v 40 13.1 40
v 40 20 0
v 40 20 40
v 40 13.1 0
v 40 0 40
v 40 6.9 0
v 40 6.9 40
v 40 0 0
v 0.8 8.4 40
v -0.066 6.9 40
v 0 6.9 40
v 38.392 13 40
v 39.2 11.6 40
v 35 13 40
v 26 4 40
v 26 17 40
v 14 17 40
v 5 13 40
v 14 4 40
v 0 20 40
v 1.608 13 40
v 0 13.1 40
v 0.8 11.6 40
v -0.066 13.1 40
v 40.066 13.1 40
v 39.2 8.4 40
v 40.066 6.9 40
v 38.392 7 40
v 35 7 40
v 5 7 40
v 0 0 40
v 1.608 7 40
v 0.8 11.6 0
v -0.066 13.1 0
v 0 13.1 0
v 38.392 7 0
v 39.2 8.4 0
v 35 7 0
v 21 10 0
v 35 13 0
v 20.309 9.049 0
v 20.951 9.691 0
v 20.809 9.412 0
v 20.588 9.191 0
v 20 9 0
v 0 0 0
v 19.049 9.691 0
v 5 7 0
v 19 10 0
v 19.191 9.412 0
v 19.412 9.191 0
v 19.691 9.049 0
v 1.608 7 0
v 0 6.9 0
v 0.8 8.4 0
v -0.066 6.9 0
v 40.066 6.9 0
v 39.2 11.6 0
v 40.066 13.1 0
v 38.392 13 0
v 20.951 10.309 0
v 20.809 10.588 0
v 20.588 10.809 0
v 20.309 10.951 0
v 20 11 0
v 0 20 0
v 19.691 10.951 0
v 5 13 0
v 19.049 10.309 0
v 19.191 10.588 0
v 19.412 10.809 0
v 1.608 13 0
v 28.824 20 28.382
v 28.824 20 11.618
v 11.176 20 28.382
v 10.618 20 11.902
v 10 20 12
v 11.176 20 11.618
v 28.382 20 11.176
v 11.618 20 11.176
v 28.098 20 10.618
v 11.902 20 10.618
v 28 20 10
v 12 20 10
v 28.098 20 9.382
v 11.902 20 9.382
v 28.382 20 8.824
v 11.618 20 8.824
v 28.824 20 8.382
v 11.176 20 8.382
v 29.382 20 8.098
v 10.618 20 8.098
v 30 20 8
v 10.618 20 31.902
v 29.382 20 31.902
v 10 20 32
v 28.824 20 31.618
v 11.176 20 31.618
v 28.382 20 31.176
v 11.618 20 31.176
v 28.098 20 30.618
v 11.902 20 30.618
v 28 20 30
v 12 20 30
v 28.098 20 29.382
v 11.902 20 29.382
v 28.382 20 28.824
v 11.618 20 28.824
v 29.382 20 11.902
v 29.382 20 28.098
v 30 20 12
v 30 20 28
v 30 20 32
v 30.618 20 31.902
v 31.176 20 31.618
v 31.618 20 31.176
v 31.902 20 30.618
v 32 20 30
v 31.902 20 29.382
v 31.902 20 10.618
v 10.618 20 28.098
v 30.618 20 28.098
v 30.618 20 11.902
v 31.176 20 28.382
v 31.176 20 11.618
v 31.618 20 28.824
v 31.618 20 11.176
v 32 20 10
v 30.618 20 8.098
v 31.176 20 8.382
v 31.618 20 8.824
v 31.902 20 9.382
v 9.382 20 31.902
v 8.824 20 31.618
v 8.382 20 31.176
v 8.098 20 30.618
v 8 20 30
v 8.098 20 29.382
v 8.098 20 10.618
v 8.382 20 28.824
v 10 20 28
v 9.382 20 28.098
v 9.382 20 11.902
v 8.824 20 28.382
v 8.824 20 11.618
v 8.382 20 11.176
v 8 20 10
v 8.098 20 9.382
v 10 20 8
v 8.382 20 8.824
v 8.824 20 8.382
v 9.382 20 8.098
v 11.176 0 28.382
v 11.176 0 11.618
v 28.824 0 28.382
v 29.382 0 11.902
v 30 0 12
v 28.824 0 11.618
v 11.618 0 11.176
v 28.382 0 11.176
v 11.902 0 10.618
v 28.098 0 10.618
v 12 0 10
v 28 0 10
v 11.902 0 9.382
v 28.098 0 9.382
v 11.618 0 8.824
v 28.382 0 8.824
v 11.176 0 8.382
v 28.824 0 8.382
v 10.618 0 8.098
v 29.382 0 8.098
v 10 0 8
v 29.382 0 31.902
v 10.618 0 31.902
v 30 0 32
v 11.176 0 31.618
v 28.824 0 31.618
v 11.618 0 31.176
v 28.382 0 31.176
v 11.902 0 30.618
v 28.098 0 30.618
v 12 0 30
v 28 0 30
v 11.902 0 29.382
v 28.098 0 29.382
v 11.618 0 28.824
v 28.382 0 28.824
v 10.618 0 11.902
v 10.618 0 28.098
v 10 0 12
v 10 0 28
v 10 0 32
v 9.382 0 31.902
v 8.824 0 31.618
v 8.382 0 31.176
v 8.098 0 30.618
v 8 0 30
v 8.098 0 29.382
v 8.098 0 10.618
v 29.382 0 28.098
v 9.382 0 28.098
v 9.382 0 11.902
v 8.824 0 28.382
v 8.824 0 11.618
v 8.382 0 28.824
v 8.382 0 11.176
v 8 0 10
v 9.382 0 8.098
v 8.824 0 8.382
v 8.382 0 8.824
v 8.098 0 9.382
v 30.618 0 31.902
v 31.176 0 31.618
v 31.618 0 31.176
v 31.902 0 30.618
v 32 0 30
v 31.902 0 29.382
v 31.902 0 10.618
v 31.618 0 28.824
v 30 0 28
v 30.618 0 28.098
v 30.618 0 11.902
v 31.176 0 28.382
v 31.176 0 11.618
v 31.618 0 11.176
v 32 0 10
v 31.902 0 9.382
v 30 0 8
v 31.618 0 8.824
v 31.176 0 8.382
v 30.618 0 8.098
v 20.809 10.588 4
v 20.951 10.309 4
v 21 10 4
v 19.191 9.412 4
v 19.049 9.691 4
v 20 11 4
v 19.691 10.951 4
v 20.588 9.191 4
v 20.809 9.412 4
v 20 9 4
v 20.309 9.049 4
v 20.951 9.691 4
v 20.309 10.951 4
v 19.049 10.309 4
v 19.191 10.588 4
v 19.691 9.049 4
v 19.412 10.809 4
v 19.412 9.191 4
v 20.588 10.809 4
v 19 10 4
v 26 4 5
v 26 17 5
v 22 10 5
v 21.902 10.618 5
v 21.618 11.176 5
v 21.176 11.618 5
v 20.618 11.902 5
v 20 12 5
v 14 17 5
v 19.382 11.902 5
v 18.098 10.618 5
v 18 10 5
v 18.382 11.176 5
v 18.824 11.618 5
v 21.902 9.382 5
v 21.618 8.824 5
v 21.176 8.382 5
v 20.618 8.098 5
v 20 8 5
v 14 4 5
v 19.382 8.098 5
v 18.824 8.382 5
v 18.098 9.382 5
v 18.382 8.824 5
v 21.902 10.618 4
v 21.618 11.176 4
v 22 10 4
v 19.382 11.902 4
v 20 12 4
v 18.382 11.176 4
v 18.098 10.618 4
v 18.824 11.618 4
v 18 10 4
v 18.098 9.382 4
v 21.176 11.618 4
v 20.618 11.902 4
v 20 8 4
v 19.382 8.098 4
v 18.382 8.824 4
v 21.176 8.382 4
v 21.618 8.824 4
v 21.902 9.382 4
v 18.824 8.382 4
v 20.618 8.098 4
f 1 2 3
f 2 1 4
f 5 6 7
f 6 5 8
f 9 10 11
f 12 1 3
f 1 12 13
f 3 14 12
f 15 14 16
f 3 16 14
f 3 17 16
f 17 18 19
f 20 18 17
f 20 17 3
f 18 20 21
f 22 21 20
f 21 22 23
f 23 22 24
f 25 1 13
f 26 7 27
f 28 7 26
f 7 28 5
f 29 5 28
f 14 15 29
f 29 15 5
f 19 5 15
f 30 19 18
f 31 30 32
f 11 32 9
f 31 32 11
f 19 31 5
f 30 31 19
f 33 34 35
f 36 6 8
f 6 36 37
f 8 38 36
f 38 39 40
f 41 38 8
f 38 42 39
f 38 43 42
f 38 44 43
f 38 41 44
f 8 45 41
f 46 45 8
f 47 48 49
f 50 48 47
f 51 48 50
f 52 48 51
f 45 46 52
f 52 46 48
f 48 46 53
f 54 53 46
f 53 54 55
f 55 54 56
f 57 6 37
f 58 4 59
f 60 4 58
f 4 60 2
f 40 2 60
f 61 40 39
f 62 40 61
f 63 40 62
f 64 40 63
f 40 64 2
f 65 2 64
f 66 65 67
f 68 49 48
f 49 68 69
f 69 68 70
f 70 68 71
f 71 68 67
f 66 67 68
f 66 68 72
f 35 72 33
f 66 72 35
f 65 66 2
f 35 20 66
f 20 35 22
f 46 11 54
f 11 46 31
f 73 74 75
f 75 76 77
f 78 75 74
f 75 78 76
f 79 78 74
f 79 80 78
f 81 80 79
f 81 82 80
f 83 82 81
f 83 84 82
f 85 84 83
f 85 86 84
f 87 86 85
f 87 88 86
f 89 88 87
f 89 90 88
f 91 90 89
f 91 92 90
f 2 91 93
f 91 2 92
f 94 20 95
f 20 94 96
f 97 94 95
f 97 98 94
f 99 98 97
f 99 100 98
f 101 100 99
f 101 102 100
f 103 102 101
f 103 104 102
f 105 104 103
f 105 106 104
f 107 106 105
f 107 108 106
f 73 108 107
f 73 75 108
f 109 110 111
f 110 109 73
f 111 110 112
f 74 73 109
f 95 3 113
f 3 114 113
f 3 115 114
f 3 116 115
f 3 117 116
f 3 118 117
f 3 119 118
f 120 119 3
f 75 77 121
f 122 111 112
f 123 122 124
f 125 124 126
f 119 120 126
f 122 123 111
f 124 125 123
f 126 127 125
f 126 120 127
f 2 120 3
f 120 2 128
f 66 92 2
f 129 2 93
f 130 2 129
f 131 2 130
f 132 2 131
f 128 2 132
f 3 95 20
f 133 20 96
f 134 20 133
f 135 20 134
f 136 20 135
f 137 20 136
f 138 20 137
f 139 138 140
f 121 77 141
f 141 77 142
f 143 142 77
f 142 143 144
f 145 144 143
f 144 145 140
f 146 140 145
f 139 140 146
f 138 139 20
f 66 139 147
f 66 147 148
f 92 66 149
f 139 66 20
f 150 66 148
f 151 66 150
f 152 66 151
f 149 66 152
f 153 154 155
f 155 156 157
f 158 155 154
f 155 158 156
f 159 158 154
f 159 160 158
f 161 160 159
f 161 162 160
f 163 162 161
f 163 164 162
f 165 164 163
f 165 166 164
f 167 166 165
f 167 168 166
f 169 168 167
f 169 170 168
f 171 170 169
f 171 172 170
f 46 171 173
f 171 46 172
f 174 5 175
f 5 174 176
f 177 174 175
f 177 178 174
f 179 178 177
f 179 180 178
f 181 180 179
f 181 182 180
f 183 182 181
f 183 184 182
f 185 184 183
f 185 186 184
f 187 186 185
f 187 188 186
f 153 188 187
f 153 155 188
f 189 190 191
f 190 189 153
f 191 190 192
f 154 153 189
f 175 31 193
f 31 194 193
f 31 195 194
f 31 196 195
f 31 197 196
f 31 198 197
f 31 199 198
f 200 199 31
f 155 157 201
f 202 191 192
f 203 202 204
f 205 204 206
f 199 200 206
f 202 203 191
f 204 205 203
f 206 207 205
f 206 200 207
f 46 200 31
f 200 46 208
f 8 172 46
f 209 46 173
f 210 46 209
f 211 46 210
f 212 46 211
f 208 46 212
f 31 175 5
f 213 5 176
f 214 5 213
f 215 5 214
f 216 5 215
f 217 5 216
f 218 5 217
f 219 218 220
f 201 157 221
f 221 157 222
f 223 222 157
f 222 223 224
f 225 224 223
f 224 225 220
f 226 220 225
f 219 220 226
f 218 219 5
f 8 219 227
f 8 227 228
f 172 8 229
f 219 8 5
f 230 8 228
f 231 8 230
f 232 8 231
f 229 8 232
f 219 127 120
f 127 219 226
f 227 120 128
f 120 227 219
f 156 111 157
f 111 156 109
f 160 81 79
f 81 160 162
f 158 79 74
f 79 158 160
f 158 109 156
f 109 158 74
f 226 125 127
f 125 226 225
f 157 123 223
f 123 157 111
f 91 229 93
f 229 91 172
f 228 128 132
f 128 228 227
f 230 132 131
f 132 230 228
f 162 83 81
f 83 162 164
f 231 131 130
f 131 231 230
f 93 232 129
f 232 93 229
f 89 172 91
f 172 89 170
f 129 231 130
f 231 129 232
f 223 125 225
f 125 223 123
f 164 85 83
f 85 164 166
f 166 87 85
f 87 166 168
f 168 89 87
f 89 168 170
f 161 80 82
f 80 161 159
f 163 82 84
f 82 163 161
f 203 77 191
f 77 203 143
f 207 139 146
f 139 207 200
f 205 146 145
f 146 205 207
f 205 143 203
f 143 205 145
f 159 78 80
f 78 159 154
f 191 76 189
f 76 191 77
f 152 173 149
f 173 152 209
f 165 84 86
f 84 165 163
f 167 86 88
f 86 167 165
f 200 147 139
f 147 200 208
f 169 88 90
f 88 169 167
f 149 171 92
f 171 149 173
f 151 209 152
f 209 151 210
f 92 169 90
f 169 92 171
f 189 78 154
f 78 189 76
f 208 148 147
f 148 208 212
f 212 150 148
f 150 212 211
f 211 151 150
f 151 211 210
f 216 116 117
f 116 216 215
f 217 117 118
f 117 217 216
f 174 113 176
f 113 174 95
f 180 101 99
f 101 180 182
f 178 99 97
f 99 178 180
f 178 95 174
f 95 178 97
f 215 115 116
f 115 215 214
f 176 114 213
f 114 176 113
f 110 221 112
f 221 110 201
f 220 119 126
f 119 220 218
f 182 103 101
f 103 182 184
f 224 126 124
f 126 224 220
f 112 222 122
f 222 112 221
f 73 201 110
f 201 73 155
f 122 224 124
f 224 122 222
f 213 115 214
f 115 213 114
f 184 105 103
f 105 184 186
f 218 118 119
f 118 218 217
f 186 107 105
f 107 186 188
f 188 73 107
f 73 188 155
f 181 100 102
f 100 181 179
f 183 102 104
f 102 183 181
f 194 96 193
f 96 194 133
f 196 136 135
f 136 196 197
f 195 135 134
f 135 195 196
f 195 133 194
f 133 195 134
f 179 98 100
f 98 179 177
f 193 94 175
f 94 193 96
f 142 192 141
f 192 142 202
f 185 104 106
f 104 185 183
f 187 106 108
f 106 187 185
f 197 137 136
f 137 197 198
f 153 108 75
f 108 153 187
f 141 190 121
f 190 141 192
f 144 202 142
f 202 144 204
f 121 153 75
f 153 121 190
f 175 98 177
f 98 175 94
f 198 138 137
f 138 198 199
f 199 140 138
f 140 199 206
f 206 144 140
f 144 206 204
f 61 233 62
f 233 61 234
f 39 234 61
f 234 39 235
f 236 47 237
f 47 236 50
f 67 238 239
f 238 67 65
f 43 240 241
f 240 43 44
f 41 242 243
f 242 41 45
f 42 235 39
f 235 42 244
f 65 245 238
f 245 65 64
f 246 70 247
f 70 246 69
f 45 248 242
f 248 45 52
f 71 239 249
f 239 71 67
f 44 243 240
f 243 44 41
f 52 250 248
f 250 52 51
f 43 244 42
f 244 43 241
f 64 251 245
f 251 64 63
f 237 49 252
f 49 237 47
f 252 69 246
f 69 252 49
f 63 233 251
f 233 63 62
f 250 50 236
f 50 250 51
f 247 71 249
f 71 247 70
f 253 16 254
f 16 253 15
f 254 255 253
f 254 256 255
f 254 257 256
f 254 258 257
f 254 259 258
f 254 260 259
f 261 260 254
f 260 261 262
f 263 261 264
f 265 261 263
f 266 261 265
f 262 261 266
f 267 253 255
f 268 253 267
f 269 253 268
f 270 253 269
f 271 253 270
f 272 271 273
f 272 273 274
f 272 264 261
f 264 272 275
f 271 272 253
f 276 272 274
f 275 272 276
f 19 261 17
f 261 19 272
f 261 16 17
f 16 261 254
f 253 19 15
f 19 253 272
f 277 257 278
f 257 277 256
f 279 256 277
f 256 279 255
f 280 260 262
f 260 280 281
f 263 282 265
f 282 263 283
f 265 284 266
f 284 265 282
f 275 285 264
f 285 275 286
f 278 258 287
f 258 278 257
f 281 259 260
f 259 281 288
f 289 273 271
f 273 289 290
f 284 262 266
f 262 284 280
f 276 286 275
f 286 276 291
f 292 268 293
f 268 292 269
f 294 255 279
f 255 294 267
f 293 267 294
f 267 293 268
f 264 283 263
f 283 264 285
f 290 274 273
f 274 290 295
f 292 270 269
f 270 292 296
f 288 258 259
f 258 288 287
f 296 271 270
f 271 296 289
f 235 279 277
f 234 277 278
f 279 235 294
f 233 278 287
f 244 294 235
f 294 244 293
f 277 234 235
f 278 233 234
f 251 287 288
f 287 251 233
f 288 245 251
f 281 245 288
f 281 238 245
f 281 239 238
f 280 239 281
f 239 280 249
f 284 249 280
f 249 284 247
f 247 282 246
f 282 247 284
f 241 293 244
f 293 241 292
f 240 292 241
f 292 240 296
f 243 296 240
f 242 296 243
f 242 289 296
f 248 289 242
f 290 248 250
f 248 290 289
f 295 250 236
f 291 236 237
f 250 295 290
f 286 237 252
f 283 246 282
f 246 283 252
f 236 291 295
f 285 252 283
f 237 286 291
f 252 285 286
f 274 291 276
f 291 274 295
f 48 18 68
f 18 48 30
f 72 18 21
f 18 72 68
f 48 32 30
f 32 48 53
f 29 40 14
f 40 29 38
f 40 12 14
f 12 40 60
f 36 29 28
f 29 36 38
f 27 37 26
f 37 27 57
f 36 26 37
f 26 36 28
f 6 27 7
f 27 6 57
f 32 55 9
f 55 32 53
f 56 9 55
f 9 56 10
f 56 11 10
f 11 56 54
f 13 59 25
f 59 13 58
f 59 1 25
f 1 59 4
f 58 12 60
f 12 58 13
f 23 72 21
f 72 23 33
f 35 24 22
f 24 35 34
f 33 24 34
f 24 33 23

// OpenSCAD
module cuerpo(alto,ancho,largo, anchoagujero, radioagujero, offsetAgujero, offsetTriangulos, radioTriangulos){
    difference(){
        cube([alto,ancho,largo]);
        
        //Agujeros
        rotate([90, 0, 0])
            translate([30,10,-20])
                        cylinder(h = anchoagujero, r = radioagujero, $fn=offsetAgujero);
        rotate([90, 0, 0])
            translate([10,10,-20])
                        cylinder(h = anchoagujero, r = radioagujero, $fn=offsetAgujero);
        rotate([90, 0, 0])
            translate([30,30,-20])
                        cylinder(h = anchoagujero, r = radioagujero, $fn=offsetAgujero);
        rotate([90, 0, 0])
            translate([10,30,-20])
                        cylinder(h = anchoagujero, r = radioagujero, $fn=offsetAgujero);
        //Agujero de debajo
        translate([20,10,0])
                        cylinder(h = anchoagujero, r = 1, $fn=offsetAgujero);
        //Cubo agujero
        translate([14,4,5]){
            cube([alto/2 -8,ancho-7,largo]);
        }
        //Pequeño reborde interior cilindrico
        translate([20,10,4])
               cylinder(h = anchoagujero, r = radioagujero, $fn=offsetAgujero);
        //Bifurcaciones rectangulares de los laterales
        translate([0,7,0]){
            cube([5,6,largo]);
        }
        translate([35,7,0]){
            cube([5,6,largo]);
        }
    }
    //Bifurcaciones triangulares exteriores
        rotate([0,0,90])
            translate([7.4,-39.2,0])
                cylinder (h = largo, r= radioTriangulos, $fn=offsetTriangulos);
        rotate([0,0,90])
            translate([7.4,-0.8,0])
                cylinder (h = largo, r= radioTriangulos, $fn=offsetTriangulos);
        rotate([0,0,-90])
            translate([-12.6,39.2,0])
                cylinder (h = largo, r= radioTriangulos, $fn=offsetTriangulos);
        rotate([0,0,-90])
            translate([-12.6,0.8,0])
                cylinder (h = largo, r= radioTriangulos, $fn=offsetTriangulos);
        
}

cuerpo(40,20,40, 40,2, 20, 3, 1);
